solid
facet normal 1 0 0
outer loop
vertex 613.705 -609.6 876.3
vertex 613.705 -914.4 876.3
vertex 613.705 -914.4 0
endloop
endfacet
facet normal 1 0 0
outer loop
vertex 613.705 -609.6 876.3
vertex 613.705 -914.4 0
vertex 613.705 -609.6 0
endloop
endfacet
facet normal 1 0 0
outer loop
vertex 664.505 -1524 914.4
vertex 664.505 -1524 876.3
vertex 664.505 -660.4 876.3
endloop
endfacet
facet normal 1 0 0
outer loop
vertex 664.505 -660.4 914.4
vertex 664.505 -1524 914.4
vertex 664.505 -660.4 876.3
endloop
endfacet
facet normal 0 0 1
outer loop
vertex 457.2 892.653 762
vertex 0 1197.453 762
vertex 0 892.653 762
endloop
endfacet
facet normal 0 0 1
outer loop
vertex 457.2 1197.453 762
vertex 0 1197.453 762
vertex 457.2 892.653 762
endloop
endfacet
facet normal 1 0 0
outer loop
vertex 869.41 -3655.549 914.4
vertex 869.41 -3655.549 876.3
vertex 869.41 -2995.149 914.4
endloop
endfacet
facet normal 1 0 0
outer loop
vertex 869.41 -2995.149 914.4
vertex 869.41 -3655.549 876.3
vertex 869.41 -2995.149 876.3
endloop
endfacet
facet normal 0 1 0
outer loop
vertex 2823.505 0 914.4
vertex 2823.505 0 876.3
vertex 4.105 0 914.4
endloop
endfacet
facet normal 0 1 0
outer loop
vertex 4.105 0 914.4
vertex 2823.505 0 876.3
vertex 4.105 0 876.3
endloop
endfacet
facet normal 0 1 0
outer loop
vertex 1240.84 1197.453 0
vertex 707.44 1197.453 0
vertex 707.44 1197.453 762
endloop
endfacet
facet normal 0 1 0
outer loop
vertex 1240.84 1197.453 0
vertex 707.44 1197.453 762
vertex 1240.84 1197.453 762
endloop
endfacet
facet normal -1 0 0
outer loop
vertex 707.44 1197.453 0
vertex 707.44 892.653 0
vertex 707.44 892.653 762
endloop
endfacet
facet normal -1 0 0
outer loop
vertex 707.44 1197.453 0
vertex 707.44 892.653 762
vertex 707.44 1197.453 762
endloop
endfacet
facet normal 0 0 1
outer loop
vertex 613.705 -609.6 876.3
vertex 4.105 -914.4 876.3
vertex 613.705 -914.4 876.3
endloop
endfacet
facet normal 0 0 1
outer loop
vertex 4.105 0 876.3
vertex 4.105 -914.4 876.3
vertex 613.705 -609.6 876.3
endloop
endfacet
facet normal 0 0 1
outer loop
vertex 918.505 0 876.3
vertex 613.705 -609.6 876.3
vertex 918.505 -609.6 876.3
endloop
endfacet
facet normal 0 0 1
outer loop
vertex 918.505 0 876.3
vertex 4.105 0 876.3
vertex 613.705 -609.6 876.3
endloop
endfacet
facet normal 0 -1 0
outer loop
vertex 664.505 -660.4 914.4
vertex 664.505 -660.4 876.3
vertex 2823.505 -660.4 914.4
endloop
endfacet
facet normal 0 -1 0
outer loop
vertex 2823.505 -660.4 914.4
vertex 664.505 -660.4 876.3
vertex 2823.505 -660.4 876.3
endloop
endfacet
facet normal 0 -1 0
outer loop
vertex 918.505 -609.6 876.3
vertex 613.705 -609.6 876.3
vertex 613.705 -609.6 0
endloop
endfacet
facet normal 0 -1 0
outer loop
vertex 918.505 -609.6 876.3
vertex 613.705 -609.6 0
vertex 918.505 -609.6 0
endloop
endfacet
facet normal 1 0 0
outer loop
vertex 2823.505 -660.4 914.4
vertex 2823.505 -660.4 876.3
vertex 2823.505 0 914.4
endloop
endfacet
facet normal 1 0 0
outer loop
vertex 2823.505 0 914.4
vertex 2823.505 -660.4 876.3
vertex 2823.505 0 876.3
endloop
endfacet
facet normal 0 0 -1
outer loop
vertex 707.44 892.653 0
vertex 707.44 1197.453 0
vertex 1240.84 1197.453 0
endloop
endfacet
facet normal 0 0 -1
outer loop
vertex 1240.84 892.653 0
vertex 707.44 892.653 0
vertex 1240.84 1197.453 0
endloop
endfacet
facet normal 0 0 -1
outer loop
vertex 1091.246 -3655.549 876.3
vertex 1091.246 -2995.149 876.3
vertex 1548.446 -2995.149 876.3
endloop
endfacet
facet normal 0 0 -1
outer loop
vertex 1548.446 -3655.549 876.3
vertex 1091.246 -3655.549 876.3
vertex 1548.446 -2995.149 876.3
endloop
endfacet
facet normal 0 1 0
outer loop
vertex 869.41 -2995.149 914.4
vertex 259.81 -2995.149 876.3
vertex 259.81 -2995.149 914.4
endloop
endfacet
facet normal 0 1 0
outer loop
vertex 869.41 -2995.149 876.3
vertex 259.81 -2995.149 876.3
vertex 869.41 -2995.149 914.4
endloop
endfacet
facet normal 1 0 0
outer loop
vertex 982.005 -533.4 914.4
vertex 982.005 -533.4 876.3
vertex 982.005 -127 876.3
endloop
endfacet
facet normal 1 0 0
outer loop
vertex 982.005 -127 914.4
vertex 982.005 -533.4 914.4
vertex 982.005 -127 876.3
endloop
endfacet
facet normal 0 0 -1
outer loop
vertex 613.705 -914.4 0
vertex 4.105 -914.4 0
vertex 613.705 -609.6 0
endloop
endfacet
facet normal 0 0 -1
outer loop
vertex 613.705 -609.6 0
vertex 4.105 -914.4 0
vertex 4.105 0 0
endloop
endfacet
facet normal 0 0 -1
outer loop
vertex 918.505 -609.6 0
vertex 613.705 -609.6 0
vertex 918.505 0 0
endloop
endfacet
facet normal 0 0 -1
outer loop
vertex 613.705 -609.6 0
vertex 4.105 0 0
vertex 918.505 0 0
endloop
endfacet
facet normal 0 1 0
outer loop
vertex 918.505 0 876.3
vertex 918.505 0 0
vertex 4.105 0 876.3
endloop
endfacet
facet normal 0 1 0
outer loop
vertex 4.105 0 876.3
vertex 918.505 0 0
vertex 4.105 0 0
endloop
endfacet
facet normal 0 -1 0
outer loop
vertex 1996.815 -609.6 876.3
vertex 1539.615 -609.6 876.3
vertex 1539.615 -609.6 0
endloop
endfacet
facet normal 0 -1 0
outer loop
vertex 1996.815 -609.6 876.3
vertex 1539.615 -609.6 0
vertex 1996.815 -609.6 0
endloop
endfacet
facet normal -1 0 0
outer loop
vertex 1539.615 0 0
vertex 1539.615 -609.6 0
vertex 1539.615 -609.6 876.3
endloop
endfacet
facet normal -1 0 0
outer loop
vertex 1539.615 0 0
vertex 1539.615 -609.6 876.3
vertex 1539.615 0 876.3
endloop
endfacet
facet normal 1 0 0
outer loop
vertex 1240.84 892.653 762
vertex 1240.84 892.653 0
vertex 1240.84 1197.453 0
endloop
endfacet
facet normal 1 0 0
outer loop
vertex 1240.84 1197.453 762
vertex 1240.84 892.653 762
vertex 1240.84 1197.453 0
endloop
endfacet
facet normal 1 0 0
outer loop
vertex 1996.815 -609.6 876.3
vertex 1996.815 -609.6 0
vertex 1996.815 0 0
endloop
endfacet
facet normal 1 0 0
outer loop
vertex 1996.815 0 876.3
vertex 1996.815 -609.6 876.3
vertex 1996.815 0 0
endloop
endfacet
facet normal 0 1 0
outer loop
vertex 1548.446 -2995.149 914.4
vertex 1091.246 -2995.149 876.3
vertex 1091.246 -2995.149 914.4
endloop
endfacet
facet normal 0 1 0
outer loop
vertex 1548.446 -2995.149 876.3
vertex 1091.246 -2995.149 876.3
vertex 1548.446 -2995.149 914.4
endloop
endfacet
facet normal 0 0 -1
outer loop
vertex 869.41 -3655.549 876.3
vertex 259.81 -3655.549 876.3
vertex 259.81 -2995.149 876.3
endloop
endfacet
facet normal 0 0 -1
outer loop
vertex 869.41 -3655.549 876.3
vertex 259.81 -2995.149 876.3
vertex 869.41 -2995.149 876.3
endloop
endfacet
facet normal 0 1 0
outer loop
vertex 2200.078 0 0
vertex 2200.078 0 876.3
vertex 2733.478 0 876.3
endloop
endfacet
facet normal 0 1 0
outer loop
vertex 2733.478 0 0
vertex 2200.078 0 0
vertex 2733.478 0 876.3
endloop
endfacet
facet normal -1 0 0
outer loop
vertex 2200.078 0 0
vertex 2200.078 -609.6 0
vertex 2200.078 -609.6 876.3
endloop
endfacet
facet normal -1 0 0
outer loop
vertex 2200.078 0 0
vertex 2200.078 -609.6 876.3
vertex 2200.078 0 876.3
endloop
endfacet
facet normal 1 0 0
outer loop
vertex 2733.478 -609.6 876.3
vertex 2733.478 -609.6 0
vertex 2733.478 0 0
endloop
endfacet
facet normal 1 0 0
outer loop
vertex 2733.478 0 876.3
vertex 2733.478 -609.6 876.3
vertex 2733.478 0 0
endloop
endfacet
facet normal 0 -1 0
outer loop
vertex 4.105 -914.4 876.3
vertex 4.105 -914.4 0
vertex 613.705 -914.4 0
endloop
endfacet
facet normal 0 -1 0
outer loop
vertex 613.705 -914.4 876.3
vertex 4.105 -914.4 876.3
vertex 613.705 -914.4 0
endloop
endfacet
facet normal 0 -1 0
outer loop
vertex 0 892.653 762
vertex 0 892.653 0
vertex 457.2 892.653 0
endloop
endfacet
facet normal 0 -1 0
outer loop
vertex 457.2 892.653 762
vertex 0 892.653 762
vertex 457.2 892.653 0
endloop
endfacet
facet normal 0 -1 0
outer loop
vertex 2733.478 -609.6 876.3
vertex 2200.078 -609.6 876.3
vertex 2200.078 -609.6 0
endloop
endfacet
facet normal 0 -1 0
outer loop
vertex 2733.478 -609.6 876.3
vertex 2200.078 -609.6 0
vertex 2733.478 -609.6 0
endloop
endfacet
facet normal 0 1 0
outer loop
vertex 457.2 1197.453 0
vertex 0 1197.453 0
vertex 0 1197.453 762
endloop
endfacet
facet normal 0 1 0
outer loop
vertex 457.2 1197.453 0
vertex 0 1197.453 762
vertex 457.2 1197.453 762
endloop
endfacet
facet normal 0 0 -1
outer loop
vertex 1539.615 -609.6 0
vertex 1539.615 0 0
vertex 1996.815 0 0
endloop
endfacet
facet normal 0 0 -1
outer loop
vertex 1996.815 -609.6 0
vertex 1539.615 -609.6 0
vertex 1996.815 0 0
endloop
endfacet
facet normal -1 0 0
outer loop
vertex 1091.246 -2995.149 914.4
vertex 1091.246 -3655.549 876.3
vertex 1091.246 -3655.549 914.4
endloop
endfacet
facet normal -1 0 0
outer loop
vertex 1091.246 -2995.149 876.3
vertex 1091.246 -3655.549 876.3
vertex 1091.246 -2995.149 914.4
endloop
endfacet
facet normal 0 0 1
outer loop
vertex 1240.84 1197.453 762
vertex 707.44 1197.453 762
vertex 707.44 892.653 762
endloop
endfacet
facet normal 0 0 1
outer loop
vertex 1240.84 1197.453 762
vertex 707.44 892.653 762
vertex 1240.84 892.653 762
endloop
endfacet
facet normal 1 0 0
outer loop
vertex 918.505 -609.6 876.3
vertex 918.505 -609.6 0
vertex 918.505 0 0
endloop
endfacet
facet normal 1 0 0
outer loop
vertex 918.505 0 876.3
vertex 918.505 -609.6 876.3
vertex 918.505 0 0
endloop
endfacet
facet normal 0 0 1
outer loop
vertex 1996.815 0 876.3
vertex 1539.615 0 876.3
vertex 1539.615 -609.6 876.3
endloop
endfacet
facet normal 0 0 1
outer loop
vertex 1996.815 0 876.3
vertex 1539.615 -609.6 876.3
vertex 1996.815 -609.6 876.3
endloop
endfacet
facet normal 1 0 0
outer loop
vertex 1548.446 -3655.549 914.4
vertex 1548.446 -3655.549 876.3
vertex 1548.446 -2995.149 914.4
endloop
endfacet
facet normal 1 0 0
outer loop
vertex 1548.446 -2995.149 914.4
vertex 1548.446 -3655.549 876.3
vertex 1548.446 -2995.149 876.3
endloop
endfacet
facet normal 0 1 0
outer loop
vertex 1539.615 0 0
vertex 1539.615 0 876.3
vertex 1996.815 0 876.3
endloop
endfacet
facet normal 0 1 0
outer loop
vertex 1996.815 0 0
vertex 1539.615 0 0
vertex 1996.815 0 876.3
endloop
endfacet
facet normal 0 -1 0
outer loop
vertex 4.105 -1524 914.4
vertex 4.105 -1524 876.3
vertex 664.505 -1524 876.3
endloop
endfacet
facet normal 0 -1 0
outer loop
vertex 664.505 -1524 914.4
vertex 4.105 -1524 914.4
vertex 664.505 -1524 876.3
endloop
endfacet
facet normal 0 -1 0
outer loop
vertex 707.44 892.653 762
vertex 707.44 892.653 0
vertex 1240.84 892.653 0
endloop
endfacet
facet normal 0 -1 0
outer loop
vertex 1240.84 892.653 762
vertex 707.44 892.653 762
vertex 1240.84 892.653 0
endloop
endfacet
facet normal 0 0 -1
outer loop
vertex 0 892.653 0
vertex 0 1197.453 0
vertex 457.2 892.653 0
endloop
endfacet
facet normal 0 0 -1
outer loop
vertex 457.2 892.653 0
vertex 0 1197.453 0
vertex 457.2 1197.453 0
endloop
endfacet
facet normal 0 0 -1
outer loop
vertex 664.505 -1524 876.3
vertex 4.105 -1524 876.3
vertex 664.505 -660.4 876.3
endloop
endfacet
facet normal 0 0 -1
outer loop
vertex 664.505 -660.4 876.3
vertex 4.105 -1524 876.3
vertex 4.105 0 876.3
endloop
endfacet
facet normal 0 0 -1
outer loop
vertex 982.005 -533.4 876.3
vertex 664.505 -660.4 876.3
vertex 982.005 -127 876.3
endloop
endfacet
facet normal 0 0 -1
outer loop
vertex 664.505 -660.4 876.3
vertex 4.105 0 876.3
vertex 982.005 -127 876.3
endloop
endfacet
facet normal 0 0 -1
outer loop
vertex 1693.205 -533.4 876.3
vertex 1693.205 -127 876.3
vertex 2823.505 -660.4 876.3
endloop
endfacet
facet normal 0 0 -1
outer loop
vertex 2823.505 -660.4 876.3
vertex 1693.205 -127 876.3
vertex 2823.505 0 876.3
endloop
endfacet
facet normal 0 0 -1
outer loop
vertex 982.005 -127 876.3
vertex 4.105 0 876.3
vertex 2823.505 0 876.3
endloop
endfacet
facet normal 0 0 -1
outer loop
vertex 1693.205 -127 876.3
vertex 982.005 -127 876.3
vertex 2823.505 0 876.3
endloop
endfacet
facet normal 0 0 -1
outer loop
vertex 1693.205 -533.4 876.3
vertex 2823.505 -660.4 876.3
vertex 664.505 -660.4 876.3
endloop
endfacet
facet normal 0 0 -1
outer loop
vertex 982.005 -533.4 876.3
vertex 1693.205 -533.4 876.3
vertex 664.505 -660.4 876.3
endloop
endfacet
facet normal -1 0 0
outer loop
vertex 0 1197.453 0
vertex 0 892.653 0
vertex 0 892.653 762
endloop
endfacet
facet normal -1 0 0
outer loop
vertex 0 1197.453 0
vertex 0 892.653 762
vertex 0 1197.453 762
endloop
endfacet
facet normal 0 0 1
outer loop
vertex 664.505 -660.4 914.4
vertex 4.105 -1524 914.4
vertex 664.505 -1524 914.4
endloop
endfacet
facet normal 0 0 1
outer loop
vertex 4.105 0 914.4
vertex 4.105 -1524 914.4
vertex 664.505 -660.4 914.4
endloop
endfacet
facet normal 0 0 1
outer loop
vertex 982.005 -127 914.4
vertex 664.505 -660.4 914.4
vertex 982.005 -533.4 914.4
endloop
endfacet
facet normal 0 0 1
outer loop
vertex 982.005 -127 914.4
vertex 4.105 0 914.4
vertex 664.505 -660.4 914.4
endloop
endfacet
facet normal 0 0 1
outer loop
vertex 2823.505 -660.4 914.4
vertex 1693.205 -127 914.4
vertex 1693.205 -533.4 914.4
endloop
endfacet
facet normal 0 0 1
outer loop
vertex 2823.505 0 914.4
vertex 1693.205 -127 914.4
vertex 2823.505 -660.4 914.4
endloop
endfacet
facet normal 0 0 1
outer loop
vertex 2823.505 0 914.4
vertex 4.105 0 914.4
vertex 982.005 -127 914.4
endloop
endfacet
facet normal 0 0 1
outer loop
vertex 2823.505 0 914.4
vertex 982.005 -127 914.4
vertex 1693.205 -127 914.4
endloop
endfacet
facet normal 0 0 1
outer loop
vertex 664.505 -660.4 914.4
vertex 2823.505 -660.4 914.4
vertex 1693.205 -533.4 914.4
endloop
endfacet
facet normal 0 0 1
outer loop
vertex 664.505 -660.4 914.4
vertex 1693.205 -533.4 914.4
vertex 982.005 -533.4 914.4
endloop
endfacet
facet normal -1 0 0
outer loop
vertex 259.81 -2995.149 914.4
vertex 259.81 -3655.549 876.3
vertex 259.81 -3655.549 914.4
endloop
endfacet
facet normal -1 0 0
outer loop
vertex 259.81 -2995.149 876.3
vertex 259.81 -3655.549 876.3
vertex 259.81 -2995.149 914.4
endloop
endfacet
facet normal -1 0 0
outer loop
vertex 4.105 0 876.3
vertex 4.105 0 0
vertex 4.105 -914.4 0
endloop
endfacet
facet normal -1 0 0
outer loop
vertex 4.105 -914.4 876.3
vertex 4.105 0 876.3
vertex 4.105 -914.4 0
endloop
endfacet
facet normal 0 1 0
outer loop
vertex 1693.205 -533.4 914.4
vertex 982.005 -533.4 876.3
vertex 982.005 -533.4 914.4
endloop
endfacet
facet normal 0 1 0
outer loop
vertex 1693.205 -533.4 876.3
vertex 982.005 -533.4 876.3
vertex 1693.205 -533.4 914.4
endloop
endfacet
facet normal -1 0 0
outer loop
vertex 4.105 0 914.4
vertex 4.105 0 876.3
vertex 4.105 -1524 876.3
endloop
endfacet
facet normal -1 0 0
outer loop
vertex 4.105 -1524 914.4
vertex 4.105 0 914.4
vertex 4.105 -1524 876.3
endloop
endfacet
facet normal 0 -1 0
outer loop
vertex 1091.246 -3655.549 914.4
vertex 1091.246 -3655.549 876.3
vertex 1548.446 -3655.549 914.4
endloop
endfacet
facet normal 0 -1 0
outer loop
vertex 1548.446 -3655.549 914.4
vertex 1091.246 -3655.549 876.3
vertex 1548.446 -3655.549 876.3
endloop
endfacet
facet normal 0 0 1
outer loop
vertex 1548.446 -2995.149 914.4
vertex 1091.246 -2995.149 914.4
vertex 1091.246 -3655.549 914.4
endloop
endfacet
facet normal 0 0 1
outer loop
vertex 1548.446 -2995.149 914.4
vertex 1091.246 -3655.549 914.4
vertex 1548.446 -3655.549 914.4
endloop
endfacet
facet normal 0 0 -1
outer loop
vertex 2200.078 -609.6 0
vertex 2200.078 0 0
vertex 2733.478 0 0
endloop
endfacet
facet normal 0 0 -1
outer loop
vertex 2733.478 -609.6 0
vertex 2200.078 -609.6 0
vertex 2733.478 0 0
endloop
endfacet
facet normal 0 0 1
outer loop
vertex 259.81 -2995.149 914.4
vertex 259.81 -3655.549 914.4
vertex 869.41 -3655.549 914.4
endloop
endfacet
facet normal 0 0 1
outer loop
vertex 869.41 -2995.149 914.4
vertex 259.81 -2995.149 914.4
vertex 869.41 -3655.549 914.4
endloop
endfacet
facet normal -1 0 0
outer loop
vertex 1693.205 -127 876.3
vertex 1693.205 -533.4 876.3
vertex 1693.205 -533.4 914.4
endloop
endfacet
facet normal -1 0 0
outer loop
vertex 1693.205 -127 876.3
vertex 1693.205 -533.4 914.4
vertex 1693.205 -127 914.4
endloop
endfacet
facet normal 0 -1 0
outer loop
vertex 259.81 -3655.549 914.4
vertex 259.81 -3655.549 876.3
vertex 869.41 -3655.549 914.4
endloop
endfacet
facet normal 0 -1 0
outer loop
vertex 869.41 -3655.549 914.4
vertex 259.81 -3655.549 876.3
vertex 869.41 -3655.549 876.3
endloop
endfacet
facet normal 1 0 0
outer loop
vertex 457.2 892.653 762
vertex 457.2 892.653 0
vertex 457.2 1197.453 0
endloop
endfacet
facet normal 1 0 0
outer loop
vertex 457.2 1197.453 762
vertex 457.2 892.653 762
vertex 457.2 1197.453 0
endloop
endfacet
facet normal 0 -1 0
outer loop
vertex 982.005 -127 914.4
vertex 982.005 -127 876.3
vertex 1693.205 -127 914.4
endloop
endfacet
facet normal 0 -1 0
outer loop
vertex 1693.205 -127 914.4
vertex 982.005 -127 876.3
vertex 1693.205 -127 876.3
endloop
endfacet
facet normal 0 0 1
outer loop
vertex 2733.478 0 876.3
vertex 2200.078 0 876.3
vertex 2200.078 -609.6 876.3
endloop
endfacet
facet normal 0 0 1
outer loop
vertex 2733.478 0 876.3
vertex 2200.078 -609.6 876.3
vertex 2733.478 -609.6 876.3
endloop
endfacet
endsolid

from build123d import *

# Parameters (mm, degrees)
F0_W     = 457.2
F0_H     = 609.6
F0_W_2   = 533.4
F1_DEPTH = 876.3
F0_H_2   = 304.8
F2_DEPTH = 762
F3_W     = 711.2
F3_H     = 406.4
F3_W_2   = 609.6
F3_H_2   = 660.4
F3_W_3   = 457.2
F4_DEPTH = 38.1


with BuildPart() as f1:
    # F0 (on Top) → F1 (new body)
    with BuildSketch(Plane.XY):
        Polygon((918.504711, 0), (4.104711, 0), (4.104711, -914.4), (613.704711, -914.4), (613.704711, -609.6), (918.504711, -609.6), align=None)
        with Locations((1768.215393, -304.8)):
            Rectangle(F0_W, F0_H)
        with Locations((2466.778249, -304.8)):
            Rectangle(F0_W_2, F0_H)
    extrude(amount=F1_DEPTH)


with BuildPart() as f2:
    # F0 (on Top) → F2 (new body)
    with BuildSketch(Plane.XY):
        with Locations((228.6, 1045.05269)):
            Rectangle(F0_W, F0_H_2)
        with Locations((974.140078, 1045.05269)):
            Rectangle(F0_W_2, F0_H_2)
    extrude(amount=F2_DEPTH)


with BuildPart() as f4:
    # F3 (on face) → F4 (new body)
    with BuildSketch(Plane.XY.offset(876.3)):
        Polygon((2823.504711, 0), (918.504711, 0), (918.504711, -609.6), (613.704711, -609.6), (613.704711, -914.4), (4.104711, -914.4), (4.104711, -1524), (664.504711, -1524), (664.504711, -660.4), (2823.504711, -660.4), align=None)
        with Locations((1337.604711, -330.2)):
            Rectangle(F3_W, F3_H, mode=Mode.SUBTRACT)
        Polygon((918.504711, 0), (4.104711, 0), (4.104711, -914.4), (613.704711, -914.4), (613.704711, -609.6), (918.504711, -609.6), align=None)
        with Locations((564.610001, -3325.349049)):
            Rectangle(F3_W_2, F3_H_2)
        with Locations((1319.846486, -3325.349049)):
            Rectangle(F3_W_3, F3_H_2)
    extrude(amount=F4_DEPTH)


solid = Compound([f1.part, f2.part, f4.part])
